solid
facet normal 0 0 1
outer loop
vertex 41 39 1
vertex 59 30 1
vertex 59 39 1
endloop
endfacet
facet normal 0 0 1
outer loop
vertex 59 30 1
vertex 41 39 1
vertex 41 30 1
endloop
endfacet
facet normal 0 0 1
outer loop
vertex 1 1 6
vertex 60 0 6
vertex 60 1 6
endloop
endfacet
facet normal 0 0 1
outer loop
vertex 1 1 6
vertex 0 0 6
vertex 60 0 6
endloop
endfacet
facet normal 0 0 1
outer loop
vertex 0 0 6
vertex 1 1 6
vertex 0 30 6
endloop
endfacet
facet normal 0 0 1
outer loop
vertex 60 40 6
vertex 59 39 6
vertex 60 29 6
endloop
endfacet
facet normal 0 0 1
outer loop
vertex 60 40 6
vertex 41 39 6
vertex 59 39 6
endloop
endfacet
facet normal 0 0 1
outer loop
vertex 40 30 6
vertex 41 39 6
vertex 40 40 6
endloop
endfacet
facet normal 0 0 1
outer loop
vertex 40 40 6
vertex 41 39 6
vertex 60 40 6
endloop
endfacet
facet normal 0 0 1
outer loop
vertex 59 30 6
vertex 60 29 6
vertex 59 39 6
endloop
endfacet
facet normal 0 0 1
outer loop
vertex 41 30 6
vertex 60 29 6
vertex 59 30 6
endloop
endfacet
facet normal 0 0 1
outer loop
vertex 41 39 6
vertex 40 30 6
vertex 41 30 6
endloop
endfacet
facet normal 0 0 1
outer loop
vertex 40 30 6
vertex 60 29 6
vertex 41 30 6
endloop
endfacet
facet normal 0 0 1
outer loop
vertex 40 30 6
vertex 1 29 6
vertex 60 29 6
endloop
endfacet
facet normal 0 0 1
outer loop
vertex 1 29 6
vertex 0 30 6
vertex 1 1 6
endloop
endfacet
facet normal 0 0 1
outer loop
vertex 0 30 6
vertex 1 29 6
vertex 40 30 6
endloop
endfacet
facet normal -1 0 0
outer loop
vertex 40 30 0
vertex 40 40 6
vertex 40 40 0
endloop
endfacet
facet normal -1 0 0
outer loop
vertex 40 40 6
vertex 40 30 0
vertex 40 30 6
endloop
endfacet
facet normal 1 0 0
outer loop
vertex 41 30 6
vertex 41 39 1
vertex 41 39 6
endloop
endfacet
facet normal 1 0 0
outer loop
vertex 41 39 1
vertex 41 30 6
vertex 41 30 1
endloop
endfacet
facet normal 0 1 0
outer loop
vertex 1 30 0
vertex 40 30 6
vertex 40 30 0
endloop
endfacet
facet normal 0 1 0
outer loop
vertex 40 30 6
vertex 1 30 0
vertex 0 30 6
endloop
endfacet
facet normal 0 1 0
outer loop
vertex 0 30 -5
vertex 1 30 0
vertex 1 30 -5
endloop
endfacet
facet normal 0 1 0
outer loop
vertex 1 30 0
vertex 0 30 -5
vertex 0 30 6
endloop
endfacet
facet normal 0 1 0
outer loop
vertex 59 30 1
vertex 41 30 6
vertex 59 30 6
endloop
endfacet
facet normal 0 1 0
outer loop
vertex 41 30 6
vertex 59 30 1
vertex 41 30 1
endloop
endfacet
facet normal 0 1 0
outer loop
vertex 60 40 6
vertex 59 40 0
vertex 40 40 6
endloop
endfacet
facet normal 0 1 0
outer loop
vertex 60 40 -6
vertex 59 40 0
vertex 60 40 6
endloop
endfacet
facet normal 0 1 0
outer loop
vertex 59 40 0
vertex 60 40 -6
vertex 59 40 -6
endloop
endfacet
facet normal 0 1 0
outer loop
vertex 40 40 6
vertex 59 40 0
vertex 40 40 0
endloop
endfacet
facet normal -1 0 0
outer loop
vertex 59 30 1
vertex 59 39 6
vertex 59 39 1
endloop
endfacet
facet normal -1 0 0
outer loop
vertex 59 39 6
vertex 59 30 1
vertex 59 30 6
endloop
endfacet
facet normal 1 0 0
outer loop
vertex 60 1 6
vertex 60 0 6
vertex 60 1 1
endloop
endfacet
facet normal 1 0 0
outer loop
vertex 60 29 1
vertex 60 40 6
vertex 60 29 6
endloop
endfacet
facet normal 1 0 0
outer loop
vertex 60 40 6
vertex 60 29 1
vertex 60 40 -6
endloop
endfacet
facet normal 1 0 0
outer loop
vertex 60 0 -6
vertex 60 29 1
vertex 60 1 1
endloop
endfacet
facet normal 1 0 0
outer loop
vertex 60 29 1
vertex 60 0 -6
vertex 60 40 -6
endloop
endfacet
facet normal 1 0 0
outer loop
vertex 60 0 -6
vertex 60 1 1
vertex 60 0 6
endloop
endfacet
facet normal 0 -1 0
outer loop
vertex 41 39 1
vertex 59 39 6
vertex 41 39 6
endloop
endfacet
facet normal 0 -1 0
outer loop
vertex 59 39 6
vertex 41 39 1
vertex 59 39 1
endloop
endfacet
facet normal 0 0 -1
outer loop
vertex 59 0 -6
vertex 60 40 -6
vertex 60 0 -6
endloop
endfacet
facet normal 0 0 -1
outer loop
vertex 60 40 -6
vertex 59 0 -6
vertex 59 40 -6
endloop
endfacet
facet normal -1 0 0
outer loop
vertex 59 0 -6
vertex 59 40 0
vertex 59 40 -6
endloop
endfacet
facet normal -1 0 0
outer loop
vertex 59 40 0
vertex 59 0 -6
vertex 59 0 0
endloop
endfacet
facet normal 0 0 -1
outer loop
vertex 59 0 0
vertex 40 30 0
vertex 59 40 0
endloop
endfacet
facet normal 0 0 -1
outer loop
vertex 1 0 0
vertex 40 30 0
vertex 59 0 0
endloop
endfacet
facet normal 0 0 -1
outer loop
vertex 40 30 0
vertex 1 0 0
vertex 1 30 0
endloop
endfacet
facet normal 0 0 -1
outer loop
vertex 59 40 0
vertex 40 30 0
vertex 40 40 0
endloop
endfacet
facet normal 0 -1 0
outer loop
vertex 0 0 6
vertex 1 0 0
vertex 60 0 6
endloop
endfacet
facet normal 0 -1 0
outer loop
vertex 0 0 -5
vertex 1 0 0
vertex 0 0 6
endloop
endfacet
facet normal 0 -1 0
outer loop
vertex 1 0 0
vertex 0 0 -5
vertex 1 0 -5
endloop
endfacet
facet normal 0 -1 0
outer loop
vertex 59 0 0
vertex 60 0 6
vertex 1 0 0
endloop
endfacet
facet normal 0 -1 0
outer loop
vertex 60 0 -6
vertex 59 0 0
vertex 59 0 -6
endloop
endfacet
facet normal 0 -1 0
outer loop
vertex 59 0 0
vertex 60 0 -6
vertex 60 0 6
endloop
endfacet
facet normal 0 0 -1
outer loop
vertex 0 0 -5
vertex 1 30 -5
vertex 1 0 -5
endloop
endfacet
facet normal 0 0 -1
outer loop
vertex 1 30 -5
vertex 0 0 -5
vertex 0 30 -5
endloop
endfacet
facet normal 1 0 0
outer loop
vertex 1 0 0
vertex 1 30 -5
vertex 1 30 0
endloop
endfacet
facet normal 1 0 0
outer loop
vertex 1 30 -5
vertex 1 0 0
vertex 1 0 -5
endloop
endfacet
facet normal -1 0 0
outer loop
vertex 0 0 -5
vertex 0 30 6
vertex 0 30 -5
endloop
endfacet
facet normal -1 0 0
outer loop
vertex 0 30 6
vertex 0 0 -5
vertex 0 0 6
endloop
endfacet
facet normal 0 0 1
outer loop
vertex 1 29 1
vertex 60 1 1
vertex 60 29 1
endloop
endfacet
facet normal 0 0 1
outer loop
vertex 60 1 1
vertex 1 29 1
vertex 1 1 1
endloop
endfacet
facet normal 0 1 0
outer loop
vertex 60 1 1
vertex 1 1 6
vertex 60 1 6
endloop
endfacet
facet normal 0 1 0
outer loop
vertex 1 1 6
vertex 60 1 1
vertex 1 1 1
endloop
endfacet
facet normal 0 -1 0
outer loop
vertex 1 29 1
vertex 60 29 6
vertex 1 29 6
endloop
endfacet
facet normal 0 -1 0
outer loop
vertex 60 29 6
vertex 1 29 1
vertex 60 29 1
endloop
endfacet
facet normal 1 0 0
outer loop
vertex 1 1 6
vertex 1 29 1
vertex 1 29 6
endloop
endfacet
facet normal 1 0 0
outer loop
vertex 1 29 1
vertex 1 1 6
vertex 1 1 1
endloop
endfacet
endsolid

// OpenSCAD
THICKNESS = 1;
WIDTH = 60;
DEPTH = 30;


module table() {
    cube([WIDTH, DEPTH, THICKNESS]);

    color([1, 0, 0]) {
        rotate([90, 0, 0])
            cube([WIDTH, 5 * THICKNESS, THICKNESS]);

        translate([0, DEPTH + THICKNESS, 0])  
            rotate([90, 0, 0])
                cube([WIDTH, 5 * THICKNESS, THICKNESS]);
                
        translate([-THICKNESS, -THICKNESS, 0])
            rotate([90, 0, 90])
                cube([DEPTH + 2 * THICKNESS, 5 * THICKNESS, THICKNESS]);
    }
}

// table();

// 48 (50)
// 74 (70)

TABLE_DEPTH = 30;
TABLE_WIDTH = 60;
SMALL_STORAGE_DEPTH = 10;
SMALL_STORAGE_WIDTH = 20;


cube([TABLE_WIDTH, TABLE_DEPTH, THICKNESS]);

translate([TABLE_WIDTH - SMALL_STORAGE_WIDTH, TABLE_DEPTH, 0])
    cube([SMALL_STORAGE_WIDTH, SMALL_STORAGE_DEPTH, THICKNESS]);


color([1, 0, 0])
    translate([0, THICKNESS, THICKNESS])
        rotate([90, 0, 0])
            cube([TABLE_WIDTH, 5 * THICKNESS, THICKNESS]);

color([1, 0, 0])
    translate([0, TABLE_DEPTH, THICKNESS])
        rotate([90, 0, 0])
            cube([TABLE_WIDTH, 5 * THICKNESS, THICKNESS]);
            

color([1, 0, 0])
    translate([THICKNESS, THICKNESS, THICKNESS])
        rotate([0, -90, 0])
            cube([5 * THICKNESS, TABLE_DEPTH - 2 * THICKNESS, THICKNESS]);
            
color([0, 1, 0]) {
    translate([TABLE_WIDTH - SMALL_STORAGE_WIDTH + THICKNESS, TABLE_DEPTH, THICKNESS])
        rotate([0, -90, 0])
            cube([5 * THICKNESS, SMALL_STORAGE_DEPTH, THICKNESS]);
        
    translate([TABLE_WIDTH, TABLE_DEPTH, THICKNESS])
        rotate([0, -90, 0])
            cube([5 * THICKNESS, SMALL_STORAGE_DEPTH, THICKNESS]);
    
    translate([TABLE_DEPTH + SMALL_STORAGE_DEPTH + THICKNESS, TABLE_DEPTH + SMALL_STORAGE_DEPTH, THICKNESS])
        rotate([90, 0, 0])
            cube([SMALL_STORAGE_WIDTH - 2 * THICKNESS, 5 * THICKNESS, THICKNESS]);
}

color([0, 0, 1])
{
    translate([TABLE_WIDTH - THICKNESS, 0, 0])
        rotate([0, 90, 0])
            cube([(5 + 1) * THICKNESS, TABLE_DEPTH + SMALL_STORAGE_DEPTH, THICKNESS]);
    
    rotate([0, 90, 0])
        cube([5 * THICKNESS, TABLE_DEPTH, THICKNESS]);
    
}

LARGE_STORAGE_WIDTH = 10 * THICKNESS;

/* color([1, 1, 0]) {
    translate([TABLE_WIDTH + LARGE_STORAGE_WIDTH, 0, (5+ 1) * THICKNESS])
        rotate([0, 90, 90])
            cube([(5 * 2 + 1) * THICKNESS, LARGE_STORAGE_WIDTH, THICKNESS]);
    
    translate([TABLE_WIDTH + LARGE_STORAGE_WIDTH, TABLE_DEPTH + SMALL_STORAGE_DEPTH - THICKNESS, (5+ 1) * THICKNESS])
        rotate([0, 90, 90])
            cube([(5 * 2 + 1) * THICKNESS, LARGE_STORAGE_WIDTH, THICKNESS]);
    
    
    translate([TABLE_WIDTH, 0, - (5 + 1) * THICKNESS])
        cube([LARGE_STORAGE_WIDTH, TABLE_DEPTH + SMALL_STORAGE_DEPTH, THICKNESS]);
    
    translate([TABLE_WIDTH + LARGE_STORAGE_WIDTH, 0, (5 + 1) * THICKNESS])
        rotate([0, 90, 0])
            cube([(5 * 2 + 2) * THICKNESS, TABLE_DEPTH + SMALL_STORAGE_DEPTH, THICKNESS]);
} */
